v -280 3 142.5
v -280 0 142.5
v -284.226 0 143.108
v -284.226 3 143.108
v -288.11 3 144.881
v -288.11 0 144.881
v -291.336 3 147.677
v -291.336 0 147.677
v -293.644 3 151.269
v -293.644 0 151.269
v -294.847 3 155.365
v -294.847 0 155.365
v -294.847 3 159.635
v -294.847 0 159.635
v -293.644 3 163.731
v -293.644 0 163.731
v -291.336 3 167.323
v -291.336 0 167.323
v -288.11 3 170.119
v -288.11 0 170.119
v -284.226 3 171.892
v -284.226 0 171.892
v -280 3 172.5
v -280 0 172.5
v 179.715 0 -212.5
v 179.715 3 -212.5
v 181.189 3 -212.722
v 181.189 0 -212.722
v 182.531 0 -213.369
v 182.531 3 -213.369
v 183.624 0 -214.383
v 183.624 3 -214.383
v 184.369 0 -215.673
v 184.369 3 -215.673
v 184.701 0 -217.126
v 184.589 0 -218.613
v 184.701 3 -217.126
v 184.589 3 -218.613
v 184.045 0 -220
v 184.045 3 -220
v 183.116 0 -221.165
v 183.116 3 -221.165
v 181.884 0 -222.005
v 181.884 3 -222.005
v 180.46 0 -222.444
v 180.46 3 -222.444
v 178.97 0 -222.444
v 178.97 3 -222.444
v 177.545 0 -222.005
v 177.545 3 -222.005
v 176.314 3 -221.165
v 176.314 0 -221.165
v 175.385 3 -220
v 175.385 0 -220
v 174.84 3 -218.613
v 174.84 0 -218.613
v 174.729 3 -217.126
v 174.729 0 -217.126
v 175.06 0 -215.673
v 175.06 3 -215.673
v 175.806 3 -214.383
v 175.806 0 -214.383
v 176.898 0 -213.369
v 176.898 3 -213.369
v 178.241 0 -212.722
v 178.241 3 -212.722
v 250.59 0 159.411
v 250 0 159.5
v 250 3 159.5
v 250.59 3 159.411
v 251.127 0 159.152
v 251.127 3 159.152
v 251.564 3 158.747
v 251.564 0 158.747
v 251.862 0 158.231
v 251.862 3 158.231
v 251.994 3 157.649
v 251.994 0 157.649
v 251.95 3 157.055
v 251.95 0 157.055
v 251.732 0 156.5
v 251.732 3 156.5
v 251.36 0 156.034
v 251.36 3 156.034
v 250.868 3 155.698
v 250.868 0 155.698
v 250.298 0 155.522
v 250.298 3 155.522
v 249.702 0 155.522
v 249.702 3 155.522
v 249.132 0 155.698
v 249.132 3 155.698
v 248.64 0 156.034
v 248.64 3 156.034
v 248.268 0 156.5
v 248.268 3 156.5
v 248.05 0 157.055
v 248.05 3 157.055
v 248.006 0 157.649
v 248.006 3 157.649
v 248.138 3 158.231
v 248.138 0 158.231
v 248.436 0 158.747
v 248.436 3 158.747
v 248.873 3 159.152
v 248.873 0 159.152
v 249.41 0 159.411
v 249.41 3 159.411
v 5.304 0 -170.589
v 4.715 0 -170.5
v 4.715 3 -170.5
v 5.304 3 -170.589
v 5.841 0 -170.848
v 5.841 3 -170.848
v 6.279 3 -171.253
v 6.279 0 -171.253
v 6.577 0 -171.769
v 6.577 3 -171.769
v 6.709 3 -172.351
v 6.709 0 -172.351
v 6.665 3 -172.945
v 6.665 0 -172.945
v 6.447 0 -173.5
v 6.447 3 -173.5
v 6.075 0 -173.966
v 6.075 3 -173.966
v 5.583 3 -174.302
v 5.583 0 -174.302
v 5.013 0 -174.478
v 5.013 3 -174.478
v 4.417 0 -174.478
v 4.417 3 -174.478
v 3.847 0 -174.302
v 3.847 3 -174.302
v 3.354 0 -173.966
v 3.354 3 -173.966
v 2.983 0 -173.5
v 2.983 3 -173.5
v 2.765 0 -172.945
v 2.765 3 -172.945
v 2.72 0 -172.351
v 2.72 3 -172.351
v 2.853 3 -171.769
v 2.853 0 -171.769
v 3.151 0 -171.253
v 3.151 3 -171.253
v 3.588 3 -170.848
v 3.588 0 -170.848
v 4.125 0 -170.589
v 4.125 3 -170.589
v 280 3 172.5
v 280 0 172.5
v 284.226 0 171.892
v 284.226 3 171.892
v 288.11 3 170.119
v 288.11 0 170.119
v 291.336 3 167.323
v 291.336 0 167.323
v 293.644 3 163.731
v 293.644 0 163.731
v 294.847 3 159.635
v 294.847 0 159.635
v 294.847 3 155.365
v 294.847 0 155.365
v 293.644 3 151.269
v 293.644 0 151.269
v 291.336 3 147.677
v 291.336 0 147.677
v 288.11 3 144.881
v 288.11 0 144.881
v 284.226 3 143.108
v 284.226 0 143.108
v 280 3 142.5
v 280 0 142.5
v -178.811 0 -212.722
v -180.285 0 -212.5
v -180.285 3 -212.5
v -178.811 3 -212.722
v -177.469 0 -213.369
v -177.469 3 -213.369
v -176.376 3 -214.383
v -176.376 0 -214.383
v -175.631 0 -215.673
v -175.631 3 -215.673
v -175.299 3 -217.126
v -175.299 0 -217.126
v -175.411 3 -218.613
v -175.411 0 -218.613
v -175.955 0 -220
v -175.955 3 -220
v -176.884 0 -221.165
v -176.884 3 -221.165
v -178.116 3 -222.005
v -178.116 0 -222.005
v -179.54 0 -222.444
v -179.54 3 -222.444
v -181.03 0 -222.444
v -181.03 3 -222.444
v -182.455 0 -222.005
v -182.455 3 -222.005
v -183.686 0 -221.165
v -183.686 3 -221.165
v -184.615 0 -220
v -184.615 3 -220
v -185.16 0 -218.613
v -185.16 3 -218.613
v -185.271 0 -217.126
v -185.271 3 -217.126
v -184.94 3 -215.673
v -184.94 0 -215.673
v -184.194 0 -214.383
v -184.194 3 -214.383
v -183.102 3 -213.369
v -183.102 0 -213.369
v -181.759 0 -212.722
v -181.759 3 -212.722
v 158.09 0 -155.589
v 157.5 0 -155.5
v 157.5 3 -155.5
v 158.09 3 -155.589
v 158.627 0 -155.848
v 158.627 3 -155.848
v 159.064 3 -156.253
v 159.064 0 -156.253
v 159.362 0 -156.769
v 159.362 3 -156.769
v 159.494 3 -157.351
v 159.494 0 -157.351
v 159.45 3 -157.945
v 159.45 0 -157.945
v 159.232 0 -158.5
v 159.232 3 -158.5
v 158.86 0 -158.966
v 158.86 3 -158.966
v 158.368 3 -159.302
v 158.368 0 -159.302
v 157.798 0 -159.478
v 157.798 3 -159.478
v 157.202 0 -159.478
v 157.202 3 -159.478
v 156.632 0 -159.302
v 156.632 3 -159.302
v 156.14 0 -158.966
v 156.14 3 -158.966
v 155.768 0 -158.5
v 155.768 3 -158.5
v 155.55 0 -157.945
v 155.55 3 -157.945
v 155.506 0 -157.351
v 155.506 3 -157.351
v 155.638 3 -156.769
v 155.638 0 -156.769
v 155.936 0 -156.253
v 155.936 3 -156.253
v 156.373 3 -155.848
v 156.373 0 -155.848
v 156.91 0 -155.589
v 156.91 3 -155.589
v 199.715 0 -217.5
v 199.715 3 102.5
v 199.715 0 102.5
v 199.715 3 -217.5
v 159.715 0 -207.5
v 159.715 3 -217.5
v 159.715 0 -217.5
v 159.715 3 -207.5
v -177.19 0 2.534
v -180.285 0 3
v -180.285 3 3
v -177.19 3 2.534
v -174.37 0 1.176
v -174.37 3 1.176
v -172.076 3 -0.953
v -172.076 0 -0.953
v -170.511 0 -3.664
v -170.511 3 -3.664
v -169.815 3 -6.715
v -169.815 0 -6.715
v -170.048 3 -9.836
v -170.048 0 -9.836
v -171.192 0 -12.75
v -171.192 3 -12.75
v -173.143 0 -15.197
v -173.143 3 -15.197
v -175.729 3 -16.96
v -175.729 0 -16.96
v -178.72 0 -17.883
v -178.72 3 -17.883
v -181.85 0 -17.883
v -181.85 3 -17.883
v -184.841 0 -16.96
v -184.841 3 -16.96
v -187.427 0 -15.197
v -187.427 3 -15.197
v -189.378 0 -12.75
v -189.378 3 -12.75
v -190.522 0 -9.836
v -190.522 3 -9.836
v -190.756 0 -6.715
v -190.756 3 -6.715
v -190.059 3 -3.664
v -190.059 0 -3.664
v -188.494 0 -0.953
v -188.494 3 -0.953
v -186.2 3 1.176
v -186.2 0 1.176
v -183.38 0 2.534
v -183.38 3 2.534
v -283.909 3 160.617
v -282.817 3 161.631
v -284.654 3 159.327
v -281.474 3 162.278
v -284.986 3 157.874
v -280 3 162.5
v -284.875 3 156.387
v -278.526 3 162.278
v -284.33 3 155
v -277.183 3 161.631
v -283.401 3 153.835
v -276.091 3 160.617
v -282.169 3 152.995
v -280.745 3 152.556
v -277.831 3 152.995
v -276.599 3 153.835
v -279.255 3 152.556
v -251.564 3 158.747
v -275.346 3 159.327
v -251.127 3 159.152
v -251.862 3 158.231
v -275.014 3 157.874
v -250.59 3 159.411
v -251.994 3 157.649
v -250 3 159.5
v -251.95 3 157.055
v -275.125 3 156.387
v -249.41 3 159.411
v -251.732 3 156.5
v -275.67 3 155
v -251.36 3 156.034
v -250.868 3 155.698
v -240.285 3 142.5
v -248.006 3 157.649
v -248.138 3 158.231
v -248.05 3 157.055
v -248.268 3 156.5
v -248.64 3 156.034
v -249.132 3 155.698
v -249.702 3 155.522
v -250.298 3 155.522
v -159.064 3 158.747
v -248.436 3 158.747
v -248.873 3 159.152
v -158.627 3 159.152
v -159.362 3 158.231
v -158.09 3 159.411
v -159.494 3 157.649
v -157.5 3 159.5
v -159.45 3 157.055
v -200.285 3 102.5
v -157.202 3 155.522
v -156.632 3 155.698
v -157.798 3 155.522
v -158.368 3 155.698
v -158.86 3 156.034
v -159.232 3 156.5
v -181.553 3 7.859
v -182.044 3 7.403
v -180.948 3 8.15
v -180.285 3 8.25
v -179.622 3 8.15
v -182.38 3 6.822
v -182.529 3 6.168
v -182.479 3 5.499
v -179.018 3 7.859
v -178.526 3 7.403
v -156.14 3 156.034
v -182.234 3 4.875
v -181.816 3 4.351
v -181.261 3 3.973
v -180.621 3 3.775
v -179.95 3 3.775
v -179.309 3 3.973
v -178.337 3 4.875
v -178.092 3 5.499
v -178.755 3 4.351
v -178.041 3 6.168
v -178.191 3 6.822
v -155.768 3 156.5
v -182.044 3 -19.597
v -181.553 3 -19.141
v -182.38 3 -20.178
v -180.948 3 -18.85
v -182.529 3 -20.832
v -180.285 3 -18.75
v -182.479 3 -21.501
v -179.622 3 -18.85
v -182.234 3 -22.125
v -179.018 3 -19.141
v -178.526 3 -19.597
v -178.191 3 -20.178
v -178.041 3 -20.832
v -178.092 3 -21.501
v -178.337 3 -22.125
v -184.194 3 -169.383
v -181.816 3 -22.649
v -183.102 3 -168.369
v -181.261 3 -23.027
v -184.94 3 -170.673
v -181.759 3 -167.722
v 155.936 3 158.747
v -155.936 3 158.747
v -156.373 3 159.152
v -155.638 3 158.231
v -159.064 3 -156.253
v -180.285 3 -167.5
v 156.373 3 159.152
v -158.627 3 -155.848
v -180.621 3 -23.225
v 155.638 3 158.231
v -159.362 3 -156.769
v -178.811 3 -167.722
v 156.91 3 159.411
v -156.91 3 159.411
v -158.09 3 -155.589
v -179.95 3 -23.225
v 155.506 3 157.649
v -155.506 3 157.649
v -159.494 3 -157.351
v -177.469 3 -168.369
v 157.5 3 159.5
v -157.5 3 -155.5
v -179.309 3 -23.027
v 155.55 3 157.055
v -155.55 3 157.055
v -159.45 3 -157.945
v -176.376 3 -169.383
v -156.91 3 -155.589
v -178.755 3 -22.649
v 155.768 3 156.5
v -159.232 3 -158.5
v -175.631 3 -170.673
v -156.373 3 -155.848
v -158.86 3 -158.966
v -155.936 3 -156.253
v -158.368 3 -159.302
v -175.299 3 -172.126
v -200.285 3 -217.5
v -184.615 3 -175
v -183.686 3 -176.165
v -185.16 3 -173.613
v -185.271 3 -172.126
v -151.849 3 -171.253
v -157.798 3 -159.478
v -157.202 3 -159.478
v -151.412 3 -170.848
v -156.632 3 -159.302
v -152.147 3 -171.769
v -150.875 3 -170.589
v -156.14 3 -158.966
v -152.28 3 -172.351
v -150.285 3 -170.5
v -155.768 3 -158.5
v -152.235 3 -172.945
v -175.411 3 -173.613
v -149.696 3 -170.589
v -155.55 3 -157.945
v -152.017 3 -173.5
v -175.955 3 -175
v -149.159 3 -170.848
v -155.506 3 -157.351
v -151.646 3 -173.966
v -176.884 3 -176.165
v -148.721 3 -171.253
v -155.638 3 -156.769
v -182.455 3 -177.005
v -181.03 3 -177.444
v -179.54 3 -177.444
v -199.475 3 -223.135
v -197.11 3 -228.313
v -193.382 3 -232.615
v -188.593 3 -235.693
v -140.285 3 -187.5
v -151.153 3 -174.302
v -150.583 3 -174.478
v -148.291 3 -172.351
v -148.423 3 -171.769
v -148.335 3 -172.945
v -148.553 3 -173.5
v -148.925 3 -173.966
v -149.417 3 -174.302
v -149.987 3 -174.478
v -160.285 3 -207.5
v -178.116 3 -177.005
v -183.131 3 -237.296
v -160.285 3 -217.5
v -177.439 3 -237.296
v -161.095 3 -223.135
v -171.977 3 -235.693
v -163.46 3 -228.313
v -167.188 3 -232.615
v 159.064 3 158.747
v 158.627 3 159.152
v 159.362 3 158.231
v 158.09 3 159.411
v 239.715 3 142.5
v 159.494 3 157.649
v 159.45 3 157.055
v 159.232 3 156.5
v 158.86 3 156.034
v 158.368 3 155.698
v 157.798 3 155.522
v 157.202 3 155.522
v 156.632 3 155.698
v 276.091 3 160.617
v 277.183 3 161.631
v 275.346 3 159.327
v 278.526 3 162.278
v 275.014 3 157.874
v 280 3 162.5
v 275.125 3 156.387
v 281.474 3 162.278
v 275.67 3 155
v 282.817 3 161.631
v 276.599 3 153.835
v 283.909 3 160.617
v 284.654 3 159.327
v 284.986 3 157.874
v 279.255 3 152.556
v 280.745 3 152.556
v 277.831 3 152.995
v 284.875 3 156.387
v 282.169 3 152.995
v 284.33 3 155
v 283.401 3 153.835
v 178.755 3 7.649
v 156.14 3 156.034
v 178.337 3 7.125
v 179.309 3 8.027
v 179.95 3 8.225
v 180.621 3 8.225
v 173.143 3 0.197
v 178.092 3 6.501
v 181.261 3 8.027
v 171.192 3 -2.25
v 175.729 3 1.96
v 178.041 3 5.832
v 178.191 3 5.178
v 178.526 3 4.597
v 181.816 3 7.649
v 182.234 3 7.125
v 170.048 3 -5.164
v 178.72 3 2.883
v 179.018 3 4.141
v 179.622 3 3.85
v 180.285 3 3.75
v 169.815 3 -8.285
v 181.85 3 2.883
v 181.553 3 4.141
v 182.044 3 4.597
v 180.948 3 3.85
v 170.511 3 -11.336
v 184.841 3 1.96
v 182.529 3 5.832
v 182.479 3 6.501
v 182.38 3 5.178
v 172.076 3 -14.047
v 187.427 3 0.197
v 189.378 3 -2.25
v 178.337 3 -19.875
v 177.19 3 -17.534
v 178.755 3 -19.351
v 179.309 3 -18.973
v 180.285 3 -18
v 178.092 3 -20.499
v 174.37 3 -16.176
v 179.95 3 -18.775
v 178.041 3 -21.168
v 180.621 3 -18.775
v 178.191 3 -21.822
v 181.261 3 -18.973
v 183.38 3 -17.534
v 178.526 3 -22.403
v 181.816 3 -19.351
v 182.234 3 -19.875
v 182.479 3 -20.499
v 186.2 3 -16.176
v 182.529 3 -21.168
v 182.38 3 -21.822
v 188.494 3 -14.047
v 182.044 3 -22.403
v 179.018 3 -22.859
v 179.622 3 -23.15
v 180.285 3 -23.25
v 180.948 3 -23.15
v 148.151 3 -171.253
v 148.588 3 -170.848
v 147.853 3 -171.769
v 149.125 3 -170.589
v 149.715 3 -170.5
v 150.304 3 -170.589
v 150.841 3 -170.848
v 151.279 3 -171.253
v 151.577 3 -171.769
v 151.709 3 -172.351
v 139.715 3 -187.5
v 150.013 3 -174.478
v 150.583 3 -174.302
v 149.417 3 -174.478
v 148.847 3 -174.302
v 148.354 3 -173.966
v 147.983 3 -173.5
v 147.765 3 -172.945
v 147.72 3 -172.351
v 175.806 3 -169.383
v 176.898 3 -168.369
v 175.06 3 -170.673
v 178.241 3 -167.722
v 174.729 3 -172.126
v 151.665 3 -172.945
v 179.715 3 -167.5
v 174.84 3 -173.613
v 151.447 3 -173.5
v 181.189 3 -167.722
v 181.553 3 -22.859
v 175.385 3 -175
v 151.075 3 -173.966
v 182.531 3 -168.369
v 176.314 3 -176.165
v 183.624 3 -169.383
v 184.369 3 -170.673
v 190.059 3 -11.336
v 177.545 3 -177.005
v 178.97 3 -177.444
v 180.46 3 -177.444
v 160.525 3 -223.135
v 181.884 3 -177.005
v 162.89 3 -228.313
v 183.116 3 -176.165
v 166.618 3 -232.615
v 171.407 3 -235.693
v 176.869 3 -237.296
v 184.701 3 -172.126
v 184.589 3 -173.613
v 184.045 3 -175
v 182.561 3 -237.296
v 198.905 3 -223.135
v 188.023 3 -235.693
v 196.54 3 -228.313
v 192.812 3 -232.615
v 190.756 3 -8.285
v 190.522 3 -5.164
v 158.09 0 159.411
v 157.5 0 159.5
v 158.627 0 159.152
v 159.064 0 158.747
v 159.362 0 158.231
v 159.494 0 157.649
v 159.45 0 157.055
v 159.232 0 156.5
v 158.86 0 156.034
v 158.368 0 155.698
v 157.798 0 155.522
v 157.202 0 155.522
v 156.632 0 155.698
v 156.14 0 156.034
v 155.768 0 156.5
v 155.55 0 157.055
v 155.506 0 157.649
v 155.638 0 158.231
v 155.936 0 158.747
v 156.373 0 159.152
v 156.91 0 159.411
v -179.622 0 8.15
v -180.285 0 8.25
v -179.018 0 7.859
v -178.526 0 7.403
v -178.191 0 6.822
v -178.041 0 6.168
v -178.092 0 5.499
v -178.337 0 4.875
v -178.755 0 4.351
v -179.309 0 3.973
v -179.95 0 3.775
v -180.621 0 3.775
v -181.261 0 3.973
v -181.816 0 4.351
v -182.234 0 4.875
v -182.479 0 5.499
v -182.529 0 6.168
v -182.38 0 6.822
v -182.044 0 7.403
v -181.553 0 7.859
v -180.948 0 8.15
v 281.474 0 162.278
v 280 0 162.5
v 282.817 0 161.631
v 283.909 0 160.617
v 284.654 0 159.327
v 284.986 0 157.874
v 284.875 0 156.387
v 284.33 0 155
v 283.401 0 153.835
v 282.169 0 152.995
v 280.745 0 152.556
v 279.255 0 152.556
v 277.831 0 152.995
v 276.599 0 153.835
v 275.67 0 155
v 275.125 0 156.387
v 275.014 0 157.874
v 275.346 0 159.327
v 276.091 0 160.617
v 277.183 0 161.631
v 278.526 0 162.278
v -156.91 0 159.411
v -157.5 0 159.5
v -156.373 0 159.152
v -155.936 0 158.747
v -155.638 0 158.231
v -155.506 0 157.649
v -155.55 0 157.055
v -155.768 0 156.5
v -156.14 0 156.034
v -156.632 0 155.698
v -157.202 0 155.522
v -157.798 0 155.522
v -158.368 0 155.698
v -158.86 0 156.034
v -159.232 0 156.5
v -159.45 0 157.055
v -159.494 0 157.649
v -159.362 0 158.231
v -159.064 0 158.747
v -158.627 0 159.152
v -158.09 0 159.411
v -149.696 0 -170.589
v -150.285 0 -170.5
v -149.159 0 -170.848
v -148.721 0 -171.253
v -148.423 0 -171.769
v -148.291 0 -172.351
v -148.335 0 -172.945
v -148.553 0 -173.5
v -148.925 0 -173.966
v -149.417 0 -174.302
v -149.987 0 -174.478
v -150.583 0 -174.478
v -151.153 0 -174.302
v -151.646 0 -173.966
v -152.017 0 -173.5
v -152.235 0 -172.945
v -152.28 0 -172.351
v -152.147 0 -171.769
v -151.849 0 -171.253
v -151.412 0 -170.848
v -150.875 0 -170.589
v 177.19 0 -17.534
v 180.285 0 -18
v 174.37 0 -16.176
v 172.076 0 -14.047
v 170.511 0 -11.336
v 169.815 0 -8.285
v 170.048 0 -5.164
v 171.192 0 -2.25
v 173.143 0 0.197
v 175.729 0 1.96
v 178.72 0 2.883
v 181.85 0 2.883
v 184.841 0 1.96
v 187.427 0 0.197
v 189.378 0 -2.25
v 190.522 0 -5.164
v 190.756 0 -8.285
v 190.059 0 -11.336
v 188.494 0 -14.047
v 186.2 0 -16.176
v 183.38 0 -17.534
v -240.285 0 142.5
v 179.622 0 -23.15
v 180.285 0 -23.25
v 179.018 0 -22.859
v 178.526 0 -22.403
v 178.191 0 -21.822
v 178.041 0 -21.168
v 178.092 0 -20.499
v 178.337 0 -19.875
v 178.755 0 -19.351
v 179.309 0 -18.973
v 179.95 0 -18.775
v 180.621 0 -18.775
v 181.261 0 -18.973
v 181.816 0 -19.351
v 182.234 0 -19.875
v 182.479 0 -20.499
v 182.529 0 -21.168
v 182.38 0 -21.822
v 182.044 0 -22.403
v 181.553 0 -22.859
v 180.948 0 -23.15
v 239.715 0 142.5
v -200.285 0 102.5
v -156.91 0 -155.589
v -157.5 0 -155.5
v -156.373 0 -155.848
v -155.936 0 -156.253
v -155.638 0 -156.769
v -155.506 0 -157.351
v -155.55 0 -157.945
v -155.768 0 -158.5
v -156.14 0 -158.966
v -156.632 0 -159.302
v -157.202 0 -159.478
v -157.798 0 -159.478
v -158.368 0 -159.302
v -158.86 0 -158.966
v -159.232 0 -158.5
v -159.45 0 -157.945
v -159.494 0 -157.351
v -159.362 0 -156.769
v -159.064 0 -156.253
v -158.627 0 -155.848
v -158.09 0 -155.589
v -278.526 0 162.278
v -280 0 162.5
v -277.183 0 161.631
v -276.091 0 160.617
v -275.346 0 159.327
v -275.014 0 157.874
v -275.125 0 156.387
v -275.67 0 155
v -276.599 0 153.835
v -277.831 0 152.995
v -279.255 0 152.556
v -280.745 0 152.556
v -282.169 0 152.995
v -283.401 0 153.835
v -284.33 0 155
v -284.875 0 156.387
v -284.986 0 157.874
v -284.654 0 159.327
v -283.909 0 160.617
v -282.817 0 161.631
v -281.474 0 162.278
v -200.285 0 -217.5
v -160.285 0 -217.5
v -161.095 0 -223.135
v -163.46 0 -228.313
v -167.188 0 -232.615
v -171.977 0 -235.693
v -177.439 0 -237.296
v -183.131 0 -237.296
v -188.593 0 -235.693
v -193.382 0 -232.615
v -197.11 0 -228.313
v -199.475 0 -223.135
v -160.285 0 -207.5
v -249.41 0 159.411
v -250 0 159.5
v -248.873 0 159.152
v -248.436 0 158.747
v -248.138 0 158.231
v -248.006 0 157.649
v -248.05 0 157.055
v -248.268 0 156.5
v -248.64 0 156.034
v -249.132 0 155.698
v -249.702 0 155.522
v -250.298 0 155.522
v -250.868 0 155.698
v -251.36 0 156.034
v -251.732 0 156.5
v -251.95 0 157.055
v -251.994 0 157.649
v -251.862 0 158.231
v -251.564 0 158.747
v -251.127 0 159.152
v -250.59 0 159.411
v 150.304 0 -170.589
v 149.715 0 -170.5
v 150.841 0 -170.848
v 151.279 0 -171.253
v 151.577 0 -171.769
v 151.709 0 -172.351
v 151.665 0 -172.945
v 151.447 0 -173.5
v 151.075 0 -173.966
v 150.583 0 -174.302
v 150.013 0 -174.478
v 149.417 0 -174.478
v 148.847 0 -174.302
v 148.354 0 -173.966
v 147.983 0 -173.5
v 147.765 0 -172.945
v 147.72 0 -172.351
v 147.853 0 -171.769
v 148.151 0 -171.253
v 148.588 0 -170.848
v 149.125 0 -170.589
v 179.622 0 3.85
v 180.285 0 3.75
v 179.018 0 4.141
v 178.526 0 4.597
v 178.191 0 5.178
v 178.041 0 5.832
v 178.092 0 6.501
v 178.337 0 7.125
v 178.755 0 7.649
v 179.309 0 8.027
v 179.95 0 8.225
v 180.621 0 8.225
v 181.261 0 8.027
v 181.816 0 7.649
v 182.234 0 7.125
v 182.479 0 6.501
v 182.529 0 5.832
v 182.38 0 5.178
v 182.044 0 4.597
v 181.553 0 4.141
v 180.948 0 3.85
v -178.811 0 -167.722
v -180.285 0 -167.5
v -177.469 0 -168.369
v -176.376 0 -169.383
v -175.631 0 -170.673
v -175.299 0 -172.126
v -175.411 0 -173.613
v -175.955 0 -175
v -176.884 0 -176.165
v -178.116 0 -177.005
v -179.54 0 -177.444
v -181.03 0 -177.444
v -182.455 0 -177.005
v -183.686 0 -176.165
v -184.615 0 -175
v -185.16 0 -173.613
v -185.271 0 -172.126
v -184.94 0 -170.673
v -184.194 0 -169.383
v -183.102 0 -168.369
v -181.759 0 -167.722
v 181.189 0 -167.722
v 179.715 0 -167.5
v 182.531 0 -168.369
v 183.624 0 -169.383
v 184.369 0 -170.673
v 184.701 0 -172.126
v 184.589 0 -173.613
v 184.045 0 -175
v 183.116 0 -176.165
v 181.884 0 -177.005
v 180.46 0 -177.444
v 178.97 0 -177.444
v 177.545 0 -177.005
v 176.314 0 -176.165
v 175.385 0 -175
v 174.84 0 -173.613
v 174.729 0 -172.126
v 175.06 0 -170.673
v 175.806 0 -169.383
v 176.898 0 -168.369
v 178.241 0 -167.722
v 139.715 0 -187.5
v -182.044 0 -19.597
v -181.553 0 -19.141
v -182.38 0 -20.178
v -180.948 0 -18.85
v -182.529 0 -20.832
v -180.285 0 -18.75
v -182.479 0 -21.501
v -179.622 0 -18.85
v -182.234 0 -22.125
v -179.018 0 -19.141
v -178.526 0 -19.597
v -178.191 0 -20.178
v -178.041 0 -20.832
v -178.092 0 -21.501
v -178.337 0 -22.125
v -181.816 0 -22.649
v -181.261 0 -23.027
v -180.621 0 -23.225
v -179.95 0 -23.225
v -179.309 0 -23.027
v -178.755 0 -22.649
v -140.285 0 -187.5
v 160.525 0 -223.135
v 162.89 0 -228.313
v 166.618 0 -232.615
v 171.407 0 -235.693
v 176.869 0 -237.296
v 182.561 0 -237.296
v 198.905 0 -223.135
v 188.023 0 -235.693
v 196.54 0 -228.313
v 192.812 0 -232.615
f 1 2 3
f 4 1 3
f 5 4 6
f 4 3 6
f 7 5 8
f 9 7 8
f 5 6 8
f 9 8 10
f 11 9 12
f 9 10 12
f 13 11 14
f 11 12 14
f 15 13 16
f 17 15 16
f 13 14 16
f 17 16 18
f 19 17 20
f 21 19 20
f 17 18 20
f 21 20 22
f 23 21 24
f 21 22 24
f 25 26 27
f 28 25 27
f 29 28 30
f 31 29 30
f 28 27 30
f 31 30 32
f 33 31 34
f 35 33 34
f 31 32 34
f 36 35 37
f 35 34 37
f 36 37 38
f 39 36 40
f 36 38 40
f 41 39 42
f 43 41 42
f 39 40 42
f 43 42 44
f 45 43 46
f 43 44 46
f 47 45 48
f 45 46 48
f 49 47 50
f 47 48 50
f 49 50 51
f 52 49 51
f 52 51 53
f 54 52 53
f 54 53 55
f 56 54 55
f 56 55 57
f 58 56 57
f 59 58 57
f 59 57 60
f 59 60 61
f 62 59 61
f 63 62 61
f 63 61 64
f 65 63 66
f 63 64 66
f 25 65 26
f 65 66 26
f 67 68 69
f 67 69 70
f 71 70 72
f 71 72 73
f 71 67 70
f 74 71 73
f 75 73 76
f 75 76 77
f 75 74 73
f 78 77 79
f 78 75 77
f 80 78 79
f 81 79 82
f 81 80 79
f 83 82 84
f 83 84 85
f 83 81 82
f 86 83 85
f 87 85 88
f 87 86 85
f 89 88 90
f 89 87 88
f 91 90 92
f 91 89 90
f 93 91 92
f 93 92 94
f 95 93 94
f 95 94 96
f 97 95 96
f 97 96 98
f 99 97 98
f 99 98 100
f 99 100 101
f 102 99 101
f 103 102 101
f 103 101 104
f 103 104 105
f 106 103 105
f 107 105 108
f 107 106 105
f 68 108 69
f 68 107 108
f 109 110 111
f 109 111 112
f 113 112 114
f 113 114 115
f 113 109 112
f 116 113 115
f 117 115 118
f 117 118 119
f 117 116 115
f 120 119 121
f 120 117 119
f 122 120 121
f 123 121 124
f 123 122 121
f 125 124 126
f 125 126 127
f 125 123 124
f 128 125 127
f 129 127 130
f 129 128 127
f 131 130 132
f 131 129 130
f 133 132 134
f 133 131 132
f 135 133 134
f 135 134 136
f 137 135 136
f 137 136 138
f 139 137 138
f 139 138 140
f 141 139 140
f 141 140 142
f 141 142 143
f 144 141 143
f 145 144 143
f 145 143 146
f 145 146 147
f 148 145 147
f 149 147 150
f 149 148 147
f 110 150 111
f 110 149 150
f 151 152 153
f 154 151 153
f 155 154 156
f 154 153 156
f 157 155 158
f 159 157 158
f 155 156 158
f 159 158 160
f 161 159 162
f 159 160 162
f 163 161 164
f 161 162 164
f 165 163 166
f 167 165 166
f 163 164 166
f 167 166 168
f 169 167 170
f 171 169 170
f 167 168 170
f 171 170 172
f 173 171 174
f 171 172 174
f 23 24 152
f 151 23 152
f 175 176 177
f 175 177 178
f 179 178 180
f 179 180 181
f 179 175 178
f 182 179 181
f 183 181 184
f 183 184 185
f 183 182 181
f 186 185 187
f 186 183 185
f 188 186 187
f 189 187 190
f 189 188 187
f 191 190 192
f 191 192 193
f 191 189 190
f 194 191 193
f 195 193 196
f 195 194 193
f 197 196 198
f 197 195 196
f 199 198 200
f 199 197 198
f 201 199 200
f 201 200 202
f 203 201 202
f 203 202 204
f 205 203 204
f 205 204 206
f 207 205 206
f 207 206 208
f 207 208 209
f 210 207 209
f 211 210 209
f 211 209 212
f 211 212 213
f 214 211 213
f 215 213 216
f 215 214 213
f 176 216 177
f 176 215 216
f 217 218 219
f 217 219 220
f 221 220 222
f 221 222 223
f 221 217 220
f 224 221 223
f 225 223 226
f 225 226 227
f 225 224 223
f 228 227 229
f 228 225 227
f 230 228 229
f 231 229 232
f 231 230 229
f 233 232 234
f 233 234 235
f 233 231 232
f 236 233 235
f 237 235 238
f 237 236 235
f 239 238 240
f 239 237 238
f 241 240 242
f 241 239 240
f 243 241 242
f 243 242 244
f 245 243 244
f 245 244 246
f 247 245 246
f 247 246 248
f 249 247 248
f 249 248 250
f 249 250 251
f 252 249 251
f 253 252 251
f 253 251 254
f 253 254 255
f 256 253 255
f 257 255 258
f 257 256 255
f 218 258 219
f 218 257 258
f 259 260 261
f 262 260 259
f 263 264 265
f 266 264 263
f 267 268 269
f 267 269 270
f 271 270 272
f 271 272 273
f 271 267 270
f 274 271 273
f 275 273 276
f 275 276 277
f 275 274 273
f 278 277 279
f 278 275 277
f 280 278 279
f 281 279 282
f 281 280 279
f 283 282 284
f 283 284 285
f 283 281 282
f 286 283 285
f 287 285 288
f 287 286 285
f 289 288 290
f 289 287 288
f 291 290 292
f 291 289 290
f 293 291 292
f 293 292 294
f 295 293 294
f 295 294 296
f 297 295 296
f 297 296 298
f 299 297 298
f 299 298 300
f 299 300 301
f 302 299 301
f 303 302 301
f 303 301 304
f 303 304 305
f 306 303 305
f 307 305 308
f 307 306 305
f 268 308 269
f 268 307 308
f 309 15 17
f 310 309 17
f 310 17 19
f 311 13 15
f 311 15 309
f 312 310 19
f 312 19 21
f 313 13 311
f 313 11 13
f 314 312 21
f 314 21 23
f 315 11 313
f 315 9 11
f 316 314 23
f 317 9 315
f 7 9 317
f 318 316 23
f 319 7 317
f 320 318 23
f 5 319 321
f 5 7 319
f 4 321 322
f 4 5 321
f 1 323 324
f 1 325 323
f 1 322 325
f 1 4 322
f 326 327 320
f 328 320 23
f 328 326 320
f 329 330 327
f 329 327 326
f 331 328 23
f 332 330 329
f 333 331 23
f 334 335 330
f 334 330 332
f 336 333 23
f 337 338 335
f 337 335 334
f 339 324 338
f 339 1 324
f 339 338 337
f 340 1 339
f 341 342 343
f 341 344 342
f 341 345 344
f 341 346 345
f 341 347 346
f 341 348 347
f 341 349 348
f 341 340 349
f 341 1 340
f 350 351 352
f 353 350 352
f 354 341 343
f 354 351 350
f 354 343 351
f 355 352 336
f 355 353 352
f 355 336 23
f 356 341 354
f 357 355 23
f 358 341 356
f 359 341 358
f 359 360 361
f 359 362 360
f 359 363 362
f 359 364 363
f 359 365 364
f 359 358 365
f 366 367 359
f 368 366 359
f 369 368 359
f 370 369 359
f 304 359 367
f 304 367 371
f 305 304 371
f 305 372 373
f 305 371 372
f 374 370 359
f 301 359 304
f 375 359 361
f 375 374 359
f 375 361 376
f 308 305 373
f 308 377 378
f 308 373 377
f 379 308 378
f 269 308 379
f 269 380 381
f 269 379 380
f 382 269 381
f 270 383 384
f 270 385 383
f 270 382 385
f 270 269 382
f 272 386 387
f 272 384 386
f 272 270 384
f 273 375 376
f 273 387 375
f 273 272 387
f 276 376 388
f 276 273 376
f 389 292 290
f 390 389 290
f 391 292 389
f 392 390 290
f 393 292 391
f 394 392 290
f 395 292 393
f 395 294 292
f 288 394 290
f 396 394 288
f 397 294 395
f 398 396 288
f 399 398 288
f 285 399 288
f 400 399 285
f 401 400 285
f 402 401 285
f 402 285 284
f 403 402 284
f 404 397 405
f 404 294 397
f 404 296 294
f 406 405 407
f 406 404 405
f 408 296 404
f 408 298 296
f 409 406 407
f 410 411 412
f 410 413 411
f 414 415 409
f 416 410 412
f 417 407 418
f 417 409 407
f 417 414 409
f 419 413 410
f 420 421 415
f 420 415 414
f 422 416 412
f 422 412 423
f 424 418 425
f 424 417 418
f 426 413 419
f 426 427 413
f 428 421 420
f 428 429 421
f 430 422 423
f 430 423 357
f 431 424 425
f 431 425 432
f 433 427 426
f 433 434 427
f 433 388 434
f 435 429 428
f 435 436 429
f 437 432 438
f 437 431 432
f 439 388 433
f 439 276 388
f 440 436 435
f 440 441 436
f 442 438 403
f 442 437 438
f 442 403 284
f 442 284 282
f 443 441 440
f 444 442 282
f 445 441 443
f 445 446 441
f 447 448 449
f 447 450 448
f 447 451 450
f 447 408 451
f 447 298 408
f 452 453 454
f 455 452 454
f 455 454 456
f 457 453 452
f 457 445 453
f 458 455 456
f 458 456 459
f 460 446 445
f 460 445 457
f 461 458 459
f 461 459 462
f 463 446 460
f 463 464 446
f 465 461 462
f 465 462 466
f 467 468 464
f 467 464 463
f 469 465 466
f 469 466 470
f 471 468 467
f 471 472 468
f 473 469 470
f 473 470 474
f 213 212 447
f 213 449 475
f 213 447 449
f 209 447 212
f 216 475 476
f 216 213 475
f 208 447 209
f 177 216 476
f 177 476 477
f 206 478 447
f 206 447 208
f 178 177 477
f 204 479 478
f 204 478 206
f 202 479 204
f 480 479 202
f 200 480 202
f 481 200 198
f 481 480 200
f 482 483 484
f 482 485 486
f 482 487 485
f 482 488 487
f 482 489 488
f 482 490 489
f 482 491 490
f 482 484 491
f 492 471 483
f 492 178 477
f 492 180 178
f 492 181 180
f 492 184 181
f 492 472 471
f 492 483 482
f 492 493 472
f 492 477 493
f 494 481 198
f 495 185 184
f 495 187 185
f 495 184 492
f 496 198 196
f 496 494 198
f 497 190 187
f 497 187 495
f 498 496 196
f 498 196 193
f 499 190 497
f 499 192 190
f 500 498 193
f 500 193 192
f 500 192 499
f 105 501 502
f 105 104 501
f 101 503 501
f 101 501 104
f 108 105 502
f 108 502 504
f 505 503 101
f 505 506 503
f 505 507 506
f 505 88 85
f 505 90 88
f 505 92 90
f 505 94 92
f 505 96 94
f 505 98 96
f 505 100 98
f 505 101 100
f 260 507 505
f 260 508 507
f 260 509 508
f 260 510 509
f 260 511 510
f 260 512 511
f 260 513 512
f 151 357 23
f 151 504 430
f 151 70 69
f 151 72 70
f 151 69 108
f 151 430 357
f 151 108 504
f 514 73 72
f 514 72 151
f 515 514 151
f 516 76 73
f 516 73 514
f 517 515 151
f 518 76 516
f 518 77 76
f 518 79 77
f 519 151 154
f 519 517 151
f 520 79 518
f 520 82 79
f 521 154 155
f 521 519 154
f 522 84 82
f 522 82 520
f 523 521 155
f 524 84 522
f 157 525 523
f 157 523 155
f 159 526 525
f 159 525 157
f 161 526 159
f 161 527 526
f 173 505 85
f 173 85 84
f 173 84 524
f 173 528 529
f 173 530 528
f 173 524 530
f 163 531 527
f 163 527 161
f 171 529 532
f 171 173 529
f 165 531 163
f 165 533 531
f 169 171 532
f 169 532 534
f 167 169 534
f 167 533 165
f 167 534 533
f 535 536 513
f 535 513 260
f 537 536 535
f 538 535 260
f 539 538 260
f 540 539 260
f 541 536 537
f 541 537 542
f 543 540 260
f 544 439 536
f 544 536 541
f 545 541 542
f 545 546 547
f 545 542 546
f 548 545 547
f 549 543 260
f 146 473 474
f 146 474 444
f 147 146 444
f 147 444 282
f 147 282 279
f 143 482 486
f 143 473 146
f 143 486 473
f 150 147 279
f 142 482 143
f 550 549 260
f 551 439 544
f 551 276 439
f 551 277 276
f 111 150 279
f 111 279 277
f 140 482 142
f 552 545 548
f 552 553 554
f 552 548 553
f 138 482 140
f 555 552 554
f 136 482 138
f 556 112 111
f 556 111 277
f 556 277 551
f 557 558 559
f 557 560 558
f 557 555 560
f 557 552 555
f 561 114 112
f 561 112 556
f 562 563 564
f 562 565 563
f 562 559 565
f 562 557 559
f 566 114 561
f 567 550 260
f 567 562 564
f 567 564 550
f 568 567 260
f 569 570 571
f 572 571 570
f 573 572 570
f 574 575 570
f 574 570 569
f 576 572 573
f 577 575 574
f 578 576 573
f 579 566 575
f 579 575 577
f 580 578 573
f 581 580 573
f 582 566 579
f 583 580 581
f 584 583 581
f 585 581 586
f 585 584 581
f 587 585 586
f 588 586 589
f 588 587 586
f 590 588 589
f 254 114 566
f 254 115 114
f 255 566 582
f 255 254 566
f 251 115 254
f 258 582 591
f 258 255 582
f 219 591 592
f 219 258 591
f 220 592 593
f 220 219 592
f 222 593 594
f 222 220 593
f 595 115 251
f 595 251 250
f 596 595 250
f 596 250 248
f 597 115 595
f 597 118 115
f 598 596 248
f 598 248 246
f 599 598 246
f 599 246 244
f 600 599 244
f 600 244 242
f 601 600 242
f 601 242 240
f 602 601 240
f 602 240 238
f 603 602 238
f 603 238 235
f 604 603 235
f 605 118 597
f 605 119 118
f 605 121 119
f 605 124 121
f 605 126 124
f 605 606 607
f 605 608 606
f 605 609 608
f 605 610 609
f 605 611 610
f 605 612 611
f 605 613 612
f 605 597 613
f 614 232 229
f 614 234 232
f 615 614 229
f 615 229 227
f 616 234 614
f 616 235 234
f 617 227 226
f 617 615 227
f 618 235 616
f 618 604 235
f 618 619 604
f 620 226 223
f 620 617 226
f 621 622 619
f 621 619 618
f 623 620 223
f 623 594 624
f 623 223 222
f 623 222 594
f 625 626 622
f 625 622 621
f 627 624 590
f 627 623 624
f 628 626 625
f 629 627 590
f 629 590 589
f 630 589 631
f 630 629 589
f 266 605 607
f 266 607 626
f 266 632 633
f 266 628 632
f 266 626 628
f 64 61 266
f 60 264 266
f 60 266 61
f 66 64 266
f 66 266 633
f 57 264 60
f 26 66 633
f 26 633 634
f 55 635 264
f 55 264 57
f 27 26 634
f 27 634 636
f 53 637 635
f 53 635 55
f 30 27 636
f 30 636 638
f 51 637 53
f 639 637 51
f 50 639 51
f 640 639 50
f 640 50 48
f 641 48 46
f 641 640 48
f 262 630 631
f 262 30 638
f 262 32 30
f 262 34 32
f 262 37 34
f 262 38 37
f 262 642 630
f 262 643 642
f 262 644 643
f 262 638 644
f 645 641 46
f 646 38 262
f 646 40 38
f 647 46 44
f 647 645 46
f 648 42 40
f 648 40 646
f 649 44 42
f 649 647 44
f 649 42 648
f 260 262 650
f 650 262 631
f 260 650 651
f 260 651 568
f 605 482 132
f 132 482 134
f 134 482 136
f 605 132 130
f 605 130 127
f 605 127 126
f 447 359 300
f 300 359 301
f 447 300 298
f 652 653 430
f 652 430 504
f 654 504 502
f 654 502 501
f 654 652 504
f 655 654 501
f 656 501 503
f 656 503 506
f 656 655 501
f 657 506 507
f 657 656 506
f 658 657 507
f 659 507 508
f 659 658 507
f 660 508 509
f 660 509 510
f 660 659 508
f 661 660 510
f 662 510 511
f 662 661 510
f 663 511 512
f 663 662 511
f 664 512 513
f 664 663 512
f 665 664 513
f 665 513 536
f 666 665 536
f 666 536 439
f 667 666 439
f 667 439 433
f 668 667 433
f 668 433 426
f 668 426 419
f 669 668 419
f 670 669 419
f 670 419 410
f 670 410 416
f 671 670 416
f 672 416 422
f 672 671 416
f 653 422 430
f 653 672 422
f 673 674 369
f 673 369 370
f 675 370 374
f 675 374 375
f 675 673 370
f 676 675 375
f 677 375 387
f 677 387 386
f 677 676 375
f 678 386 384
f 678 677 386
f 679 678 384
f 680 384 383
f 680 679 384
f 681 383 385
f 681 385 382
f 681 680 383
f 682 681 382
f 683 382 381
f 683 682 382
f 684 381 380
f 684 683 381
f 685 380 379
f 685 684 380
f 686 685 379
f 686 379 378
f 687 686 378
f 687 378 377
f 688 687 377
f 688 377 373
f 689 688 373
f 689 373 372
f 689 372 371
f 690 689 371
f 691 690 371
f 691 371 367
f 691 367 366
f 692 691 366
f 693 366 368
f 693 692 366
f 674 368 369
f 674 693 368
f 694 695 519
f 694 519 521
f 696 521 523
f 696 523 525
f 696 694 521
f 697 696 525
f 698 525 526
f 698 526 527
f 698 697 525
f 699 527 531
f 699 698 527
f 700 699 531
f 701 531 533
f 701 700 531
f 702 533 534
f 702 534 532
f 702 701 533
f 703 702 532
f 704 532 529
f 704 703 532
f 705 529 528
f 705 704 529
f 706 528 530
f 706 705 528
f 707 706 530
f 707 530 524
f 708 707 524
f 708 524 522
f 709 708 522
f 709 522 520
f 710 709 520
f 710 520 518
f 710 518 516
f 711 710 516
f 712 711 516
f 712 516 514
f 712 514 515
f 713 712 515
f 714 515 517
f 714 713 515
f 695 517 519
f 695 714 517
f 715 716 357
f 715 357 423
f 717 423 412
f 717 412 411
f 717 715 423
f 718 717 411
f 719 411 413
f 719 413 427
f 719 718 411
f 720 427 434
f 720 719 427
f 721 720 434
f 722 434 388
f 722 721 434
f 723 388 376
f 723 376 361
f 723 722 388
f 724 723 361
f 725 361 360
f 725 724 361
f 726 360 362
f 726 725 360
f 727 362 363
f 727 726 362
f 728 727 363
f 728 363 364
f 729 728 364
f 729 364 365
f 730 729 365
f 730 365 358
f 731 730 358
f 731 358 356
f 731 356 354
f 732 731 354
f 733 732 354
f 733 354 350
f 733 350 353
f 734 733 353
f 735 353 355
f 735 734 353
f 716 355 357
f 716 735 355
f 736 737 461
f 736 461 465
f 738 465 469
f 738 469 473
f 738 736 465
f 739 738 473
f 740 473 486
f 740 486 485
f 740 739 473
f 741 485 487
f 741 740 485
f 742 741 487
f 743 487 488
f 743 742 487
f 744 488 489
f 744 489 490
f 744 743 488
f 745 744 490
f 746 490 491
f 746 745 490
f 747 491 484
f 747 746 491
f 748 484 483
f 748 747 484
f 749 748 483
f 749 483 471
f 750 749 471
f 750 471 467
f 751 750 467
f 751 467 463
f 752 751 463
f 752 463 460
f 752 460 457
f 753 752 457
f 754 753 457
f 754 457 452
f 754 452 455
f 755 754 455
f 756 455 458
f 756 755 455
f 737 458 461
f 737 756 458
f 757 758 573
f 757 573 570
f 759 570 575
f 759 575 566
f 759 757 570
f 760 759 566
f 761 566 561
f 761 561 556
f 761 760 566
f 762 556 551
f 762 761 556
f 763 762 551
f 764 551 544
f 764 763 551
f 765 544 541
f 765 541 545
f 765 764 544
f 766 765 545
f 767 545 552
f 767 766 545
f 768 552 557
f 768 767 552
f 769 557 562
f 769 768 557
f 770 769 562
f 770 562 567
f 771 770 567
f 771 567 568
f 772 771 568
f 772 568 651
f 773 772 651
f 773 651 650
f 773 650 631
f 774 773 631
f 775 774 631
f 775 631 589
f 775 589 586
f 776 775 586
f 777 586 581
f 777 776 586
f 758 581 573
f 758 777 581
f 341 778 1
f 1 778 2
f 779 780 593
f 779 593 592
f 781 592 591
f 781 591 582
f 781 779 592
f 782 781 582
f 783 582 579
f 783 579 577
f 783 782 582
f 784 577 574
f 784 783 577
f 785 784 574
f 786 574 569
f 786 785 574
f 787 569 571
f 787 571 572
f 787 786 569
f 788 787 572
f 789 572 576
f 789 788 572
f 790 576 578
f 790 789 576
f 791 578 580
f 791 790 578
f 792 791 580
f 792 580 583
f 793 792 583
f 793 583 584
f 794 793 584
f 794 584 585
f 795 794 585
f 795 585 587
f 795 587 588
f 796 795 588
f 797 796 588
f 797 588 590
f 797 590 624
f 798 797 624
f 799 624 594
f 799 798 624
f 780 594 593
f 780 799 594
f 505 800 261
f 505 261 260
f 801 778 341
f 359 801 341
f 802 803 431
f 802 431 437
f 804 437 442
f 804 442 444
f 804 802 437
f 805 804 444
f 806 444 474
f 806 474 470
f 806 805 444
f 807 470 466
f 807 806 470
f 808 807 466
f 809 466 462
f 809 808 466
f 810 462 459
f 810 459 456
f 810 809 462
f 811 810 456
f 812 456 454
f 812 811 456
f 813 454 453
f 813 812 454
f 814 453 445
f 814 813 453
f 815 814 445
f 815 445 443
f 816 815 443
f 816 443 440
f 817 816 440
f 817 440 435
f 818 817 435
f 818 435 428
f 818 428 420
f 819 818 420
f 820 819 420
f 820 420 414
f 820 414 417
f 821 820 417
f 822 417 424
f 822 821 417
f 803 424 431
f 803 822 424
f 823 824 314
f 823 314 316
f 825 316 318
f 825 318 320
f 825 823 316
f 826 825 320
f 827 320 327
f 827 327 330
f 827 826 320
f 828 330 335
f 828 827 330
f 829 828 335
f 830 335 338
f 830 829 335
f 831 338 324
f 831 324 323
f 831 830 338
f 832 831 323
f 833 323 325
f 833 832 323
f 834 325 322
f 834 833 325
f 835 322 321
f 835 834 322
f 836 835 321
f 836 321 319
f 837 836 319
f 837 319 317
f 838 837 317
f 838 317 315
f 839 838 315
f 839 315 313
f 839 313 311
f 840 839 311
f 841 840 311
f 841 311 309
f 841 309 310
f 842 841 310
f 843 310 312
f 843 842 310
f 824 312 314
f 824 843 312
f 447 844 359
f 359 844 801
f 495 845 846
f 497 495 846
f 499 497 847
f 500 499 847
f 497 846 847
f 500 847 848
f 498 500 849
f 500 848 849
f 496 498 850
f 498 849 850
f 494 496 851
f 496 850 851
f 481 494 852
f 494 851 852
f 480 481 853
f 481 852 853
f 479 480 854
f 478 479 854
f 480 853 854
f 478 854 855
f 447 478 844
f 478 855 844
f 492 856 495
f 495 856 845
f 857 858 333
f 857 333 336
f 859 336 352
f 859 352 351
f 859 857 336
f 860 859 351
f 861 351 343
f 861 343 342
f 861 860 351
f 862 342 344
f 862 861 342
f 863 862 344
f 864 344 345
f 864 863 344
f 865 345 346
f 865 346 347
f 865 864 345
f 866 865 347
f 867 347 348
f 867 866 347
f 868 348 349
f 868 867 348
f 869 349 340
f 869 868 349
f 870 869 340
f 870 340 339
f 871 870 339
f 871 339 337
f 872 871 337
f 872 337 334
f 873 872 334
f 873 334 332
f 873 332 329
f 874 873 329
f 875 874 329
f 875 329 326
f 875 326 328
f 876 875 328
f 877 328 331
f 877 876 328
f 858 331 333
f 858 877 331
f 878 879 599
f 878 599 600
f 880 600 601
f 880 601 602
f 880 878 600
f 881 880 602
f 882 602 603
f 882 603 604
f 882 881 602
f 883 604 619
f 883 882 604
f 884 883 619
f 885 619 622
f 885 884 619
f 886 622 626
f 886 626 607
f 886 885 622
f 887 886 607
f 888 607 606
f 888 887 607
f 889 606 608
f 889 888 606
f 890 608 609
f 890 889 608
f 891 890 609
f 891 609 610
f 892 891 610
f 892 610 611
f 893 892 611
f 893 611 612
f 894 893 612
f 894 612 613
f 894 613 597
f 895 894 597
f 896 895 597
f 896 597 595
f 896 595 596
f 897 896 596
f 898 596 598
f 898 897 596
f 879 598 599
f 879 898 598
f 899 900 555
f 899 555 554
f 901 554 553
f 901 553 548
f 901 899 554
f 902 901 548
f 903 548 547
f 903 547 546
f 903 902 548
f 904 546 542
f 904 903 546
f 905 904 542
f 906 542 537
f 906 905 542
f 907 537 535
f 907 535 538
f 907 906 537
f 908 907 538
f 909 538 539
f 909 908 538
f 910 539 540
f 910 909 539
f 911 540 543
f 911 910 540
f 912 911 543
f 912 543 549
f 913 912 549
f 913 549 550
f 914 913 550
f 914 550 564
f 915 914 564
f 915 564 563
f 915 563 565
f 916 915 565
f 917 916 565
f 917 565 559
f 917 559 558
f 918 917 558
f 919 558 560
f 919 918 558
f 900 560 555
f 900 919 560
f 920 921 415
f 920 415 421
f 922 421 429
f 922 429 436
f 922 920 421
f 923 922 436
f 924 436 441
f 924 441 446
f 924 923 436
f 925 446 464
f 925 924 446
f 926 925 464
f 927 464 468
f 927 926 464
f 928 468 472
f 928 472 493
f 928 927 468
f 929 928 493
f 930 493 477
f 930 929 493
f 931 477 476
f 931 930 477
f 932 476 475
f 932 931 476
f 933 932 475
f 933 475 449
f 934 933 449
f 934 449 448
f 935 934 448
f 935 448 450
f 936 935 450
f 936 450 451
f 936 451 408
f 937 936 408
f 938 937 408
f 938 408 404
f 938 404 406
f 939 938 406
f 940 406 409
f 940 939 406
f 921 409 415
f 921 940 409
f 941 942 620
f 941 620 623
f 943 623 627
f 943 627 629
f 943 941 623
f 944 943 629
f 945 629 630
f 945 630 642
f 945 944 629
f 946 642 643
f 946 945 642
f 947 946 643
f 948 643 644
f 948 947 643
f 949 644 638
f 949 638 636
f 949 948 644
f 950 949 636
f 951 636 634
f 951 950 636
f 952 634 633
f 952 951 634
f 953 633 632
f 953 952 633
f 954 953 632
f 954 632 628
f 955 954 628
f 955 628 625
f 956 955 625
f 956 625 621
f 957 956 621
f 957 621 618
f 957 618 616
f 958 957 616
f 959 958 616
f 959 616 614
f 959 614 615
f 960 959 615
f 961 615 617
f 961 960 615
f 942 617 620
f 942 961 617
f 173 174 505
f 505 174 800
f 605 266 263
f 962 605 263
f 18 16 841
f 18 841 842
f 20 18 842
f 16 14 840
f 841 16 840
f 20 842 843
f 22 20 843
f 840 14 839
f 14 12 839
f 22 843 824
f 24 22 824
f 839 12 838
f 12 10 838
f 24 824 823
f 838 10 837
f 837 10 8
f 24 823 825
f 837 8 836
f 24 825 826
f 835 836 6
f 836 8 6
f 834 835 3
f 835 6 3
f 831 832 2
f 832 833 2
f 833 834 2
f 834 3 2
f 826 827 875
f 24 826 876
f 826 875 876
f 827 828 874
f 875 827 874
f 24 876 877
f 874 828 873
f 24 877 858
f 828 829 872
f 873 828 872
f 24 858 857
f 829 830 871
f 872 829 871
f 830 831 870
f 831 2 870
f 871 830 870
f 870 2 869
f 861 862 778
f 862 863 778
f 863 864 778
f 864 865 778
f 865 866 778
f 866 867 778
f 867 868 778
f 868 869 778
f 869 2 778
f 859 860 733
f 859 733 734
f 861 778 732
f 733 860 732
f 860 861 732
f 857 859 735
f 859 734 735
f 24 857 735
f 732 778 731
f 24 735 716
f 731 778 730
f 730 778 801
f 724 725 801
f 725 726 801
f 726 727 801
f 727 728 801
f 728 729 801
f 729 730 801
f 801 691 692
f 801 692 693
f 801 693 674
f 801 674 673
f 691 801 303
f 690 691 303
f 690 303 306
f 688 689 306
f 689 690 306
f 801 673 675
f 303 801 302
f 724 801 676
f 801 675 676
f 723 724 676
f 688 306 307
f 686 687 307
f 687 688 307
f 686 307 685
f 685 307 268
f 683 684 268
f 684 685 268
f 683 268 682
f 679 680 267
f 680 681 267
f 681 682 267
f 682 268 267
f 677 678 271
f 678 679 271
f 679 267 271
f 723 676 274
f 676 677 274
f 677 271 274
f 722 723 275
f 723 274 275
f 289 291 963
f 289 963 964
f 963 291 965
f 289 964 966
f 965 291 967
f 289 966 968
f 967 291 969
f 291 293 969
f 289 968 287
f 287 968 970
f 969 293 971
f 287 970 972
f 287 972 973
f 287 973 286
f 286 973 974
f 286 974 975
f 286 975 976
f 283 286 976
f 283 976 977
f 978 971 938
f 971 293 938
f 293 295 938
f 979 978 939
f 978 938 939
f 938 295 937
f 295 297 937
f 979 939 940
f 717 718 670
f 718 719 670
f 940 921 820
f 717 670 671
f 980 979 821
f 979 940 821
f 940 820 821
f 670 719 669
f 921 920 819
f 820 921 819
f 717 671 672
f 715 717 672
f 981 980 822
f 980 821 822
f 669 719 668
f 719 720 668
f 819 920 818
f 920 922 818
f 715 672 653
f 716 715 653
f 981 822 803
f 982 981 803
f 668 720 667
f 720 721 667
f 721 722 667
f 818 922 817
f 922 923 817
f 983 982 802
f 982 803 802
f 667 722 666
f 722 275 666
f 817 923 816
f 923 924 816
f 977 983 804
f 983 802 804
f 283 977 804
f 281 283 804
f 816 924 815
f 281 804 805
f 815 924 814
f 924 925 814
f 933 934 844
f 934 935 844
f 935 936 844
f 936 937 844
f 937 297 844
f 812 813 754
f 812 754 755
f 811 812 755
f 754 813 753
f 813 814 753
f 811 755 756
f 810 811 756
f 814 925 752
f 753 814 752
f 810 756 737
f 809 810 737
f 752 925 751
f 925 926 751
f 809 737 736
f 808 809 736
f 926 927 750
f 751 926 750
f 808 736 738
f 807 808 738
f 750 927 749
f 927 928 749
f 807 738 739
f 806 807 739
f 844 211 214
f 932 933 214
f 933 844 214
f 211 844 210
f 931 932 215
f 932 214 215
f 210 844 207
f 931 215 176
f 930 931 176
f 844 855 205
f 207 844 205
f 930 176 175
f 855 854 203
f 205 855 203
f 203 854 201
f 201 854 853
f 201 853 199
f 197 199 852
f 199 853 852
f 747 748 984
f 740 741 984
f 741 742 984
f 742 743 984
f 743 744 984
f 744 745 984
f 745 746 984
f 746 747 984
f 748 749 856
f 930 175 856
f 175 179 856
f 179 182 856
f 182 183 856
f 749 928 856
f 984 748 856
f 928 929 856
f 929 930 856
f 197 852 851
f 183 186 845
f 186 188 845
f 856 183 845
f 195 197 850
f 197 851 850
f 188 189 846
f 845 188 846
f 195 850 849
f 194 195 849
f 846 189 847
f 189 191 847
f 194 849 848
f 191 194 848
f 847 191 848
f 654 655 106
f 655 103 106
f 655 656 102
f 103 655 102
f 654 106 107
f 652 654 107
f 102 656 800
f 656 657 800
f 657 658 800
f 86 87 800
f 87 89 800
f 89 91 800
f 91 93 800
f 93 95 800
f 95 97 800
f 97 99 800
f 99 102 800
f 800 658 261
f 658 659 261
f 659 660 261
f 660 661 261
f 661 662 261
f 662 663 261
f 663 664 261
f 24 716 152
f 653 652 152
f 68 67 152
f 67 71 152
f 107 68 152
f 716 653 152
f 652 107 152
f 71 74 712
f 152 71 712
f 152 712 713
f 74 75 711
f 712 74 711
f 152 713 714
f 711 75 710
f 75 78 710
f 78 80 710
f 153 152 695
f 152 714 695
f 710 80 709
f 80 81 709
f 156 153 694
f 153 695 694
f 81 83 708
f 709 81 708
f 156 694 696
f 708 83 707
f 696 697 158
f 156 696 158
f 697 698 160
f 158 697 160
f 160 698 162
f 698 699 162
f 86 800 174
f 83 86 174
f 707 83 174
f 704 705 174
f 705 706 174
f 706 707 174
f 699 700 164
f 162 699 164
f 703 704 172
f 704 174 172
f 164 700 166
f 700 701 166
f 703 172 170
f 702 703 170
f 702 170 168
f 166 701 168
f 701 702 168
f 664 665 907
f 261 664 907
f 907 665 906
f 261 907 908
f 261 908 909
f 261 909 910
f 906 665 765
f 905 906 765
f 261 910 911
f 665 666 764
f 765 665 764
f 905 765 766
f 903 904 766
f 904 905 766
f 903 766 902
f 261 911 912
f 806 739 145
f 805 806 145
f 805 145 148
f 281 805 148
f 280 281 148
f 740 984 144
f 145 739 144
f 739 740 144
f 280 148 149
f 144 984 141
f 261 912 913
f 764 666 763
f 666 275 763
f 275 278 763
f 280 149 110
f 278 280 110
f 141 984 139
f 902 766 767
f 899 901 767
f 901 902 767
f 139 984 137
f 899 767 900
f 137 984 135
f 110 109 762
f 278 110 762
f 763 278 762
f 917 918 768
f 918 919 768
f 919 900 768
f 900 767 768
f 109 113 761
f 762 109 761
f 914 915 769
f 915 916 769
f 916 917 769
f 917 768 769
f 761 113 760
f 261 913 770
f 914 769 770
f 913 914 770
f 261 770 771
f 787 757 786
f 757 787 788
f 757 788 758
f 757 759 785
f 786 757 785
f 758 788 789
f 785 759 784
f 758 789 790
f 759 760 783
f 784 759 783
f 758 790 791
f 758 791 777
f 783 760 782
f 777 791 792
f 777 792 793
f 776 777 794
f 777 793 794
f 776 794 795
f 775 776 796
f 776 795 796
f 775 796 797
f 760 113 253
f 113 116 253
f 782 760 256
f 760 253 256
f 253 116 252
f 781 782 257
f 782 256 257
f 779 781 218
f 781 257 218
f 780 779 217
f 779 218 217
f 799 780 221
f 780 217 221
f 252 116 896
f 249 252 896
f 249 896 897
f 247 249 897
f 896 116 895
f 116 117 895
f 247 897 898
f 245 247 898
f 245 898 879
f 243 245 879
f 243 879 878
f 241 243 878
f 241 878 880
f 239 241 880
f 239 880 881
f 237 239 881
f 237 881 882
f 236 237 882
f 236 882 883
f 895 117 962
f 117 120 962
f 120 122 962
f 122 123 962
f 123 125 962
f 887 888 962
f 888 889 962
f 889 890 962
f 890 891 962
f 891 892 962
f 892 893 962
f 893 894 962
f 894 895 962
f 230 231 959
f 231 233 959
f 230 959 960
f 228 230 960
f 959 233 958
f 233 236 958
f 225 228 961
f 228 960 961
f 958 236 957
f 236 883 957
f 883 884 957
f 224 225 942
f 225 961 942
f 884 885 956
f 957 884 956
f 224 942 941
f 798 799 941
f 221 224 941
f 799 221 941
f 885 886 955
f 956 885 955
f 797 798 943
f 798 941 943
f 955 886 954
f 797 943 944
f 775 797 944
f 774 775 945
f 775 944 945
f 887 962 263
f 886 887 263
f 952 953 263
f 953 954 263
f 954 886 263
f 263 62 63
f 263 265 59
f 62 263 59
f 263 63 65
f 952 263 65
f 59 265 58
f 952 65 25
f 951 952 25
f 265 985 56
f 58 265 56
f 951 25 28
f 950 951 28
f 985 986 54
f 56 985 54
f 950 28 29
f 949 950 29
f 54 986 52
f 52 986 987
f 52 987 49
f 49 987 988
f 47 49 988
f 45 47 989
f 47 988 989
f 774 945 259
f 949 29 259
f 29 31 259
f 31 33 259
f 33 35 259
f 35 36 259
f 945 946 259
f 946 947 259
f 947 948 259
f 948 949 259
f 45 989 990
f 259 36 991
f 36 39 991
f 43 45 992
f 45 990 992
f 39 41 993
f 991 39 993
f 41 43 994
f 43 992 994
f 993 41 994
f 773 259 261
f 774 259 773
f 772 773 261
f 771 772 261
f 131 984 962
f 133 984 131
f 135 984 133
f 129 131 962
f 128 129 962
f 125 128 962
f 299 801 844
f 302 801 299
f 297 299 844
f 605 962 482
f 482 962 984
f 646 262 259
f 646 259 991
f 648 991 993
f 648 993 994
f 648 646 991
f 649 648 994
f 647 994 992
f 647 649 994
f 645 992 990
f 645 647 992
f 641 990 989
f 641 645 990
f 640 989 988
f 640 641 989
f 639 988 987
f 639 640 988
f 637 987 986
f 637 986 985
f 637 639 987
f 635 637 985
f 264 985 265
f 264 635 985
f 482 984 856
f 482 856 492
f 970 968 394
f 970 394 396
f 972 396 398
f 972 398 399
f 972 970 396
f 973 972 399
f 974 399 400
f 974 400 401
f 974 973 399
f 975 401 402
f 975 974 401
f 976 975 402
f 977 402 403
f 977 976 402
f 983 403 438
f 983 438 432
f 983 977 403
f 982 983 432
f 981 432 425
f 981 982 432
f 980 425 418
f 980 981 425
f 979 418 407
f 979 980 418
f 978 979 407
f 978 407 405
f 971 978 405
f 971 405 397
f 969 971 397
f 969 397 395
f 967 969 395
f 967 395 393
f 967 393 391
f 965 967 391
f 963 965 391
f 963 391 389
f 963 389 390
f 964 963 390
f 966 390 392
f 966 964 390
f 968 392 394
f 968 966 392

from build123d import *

# Parameters (mm, degrees)
SKETCH1_R           = 2
SKETCH1_R_2         = 5
SKETCH1_R_3         = 10.5
SKETCH1_R_4         = 2.25
BOSS_EXTRUDE1_DEPTH = 3
SKETCH2_R           = 5
BOSS_EXTRUDE2_DEPTH = 3
CHAMFER2_SIZE       = 20
CHAMFER3_SIZE       = 40


with BuildPart() as part:
    # Sketch1 → Boss-Extrude1 (new body)
    with BuildSketch(Plane(origin=(0, 0, 0), x_dir=(1, 0, 0), z_dir=(0, 1, 0))):
        with BuildLine():
            Line((-200.2851606, -142.500000035), (-280, -142.500000035))
            ThreePointArc((-280, -142.500000035), (-294.999999965, -157.5), (-280, -172.499999965))
            Line((-280, -172.499999965), (280, -172.499999965))
            ThreePointArc((280, -172.499999965), (294.999999965, -157.5), (280, -142.500000035))
            Line((280, -142.500000035), (199.7148394, -142.500000035))
            Line((199.7148394, -142.500000035), (199.7148394, 187.499999965))
            Line((199.7148394, 187.499999965), (-160.2851606, 187.499999965))
            Line((-160.2851606, 187.499999965), (-160.2851606, 217.499999965))
            ThreePointArc((-160.2851606, 217.499999965), (-180.2851606, 237.499999965), (-200.2851606, 217.499999965))
            Line((-200.2851606, 217.499999965), (-200.2851606, 187.499999965))
            Line((-200.2851606, 187.499999965), (-200.2851606, -142.500000035))
        make_face()
        with Locations(Location((-157.5, 157.5, 0), (0, 0, 270))):
            Circle(SKETCH1_R, mode=Mode.SUBTRACT)
        with Locations(Location((157.5, 157.5, 0), (0, 0, 270))):
            Circle(SKETCH1_R, mode=Mode.SUBTRACT)
        with Locations(Location((157.5, -157.5, 0), (0, 0, 270))):
            Circle(SKETCH1_R, mode=Mode.SUBTRACT)
        with Locations(Location((-157.5, -157.5, 0), (0, 0, 270))):
            Circle(SKETCH1_R, mode=Mode.SUBTRACT)
        with Locations(Location((-280, -157.5, 0), (0, 0, 270))):
            Circle(SKETCH1_R_2, mode=Mode.SUBTRACT)
        with Locations(Location((280, -157.5, 0), (0, 0, 270))):
            Circle(SKETCH1_R_2, mode=Mode.SUBTRACT)
        with Locations(Location((-250, -157.5, 0), (0, 0, 270))):
            Circle(SKETCH1_R, mode=Mode.SUBTRACT)
        with Locations(Location((250, -157.5, 0), (0, 0, 270))):
            Circle(SKETCH1_R, mode=Mode.SUBTRACT)
        with Locations(Location((-180.2851606, 172.499999965, 0), (0, 0, 270))):
            Circle(SKETCH1_R_2, mode=Mode.SUBTRACT)
        with Locations(Location((179.7148394, 172.499999965, 0), (0, 0, 270))):
            Circle(SKETCH1_R_2, mode=Mode.SUBTRACT)
        with Locations(Location((-150.2851606, 172.499999965, 0), (0, 0, 270))):
            Circle(SKETCH1_R, mode=Mode.SUBTRACT)
        with Locations(Location((4.7148394, 172.499999965, 0), (0, 0, 270))):
            Circle(SKETCH1_R, mode=Mode.SUBTRACT)
        with Locations(Location((149.7148394, 172.499999965, 0), (0, 0, 270))):
            Circle(SKETCH1_R, mode=Mode.SUBTRACT)
        with Locations(Location((-180.2851606, 7.499999983, 0), (0, 0, 270))):
            Circle(SKETCH1_R_3, mode=Mode.SUBTRACT)
        with Locations(Location((-180.2851606, 20.999999983, 0), (0, 0, 270))):
            Circle(SKETCH1_R_4, mode=Mode.SUBTRACT)
        with Locations(Location((-180.2851606, -6.000000017, 0), (0, 0, 270))):
            Circle(SKETCH1_R_4, mode=Mode.SUBTRACT)
        with Locations(Location((180.2851606, -6.000000017, 0), (0, 0, 90))):
            Circle(SKETCH1_R_4, mode=Mode.SUBTRACT)
        with Locations(Location((180.2851606, 20.999999983, 0), (0, 0, 90))):
            Circle(SKETCH1_R_4, mode=Mode.SUBTRACT)
        with Locations(Location((180.2851606, 7.499999983, 0), (0, 0, 90))):
            Circle(SKETCH1_R_3, mode=Mode.SUBTRACT)
        with Locations(Location((-180.2851606, 217.499999965, 0), (0, 0, 270))):
            Circle(SKETCH1_R_2, mode=Mode.SUBTRACT)
    extrude(amount=BOSS_EXTRUDE1_DEPTH)

    # Sketch2 → Boss-Extrude2 (add)
    with BuildSketch(Plane(origin=(0, 3, 0), x_dir=(1, 0, 0), z_dir=(0, 1, 0))):
        with BuildLine():
            Line((199.7148394, 187.499999965), (199.7148394, 217.499999965))
            ThreePointArc((199.7148394, 217.499999965), (179.7148394, 237.499999965), (159.7148394, 217.499999965))
            Line((159.7148394, 217.499999965), (159.7148394, 187.499999965))
            Line((159.7148394, 187.499999965), (199.7148394, 187.499999965))
        make_face()
        with Locations(Location((179.7148394, 217.499999965, 0), (0, 0, 270))):
            Circle(SKETCH2_R, mode=Mode.SUBTRACT)
    extrude(amount=-BOSS_EXTRUDE2_DEPTH)

    # Chamfer2
    chamfer2_edges = [part.edges().sort_by_distance(p)[0] for p in [
        (159.7148394, 1.5, -187.499999965),
        (-160.2851606, 1.5, -187.499999965),
    ]]
    chamfer(chamfer2_edges, length=CHAMFER2_SIZE)

    # Chamfer3
    chamfer3_edges = [part.edges().sort_by_distance(p)[0] for p in [
        (-200.2851606, 1.5, 142.500000035),
        (199.7148394, 1.5, 142.500000035),
    ]]
    chamfer(chamfer3_edges, length=CHAMFER3_SIZE)


solid = part.part
